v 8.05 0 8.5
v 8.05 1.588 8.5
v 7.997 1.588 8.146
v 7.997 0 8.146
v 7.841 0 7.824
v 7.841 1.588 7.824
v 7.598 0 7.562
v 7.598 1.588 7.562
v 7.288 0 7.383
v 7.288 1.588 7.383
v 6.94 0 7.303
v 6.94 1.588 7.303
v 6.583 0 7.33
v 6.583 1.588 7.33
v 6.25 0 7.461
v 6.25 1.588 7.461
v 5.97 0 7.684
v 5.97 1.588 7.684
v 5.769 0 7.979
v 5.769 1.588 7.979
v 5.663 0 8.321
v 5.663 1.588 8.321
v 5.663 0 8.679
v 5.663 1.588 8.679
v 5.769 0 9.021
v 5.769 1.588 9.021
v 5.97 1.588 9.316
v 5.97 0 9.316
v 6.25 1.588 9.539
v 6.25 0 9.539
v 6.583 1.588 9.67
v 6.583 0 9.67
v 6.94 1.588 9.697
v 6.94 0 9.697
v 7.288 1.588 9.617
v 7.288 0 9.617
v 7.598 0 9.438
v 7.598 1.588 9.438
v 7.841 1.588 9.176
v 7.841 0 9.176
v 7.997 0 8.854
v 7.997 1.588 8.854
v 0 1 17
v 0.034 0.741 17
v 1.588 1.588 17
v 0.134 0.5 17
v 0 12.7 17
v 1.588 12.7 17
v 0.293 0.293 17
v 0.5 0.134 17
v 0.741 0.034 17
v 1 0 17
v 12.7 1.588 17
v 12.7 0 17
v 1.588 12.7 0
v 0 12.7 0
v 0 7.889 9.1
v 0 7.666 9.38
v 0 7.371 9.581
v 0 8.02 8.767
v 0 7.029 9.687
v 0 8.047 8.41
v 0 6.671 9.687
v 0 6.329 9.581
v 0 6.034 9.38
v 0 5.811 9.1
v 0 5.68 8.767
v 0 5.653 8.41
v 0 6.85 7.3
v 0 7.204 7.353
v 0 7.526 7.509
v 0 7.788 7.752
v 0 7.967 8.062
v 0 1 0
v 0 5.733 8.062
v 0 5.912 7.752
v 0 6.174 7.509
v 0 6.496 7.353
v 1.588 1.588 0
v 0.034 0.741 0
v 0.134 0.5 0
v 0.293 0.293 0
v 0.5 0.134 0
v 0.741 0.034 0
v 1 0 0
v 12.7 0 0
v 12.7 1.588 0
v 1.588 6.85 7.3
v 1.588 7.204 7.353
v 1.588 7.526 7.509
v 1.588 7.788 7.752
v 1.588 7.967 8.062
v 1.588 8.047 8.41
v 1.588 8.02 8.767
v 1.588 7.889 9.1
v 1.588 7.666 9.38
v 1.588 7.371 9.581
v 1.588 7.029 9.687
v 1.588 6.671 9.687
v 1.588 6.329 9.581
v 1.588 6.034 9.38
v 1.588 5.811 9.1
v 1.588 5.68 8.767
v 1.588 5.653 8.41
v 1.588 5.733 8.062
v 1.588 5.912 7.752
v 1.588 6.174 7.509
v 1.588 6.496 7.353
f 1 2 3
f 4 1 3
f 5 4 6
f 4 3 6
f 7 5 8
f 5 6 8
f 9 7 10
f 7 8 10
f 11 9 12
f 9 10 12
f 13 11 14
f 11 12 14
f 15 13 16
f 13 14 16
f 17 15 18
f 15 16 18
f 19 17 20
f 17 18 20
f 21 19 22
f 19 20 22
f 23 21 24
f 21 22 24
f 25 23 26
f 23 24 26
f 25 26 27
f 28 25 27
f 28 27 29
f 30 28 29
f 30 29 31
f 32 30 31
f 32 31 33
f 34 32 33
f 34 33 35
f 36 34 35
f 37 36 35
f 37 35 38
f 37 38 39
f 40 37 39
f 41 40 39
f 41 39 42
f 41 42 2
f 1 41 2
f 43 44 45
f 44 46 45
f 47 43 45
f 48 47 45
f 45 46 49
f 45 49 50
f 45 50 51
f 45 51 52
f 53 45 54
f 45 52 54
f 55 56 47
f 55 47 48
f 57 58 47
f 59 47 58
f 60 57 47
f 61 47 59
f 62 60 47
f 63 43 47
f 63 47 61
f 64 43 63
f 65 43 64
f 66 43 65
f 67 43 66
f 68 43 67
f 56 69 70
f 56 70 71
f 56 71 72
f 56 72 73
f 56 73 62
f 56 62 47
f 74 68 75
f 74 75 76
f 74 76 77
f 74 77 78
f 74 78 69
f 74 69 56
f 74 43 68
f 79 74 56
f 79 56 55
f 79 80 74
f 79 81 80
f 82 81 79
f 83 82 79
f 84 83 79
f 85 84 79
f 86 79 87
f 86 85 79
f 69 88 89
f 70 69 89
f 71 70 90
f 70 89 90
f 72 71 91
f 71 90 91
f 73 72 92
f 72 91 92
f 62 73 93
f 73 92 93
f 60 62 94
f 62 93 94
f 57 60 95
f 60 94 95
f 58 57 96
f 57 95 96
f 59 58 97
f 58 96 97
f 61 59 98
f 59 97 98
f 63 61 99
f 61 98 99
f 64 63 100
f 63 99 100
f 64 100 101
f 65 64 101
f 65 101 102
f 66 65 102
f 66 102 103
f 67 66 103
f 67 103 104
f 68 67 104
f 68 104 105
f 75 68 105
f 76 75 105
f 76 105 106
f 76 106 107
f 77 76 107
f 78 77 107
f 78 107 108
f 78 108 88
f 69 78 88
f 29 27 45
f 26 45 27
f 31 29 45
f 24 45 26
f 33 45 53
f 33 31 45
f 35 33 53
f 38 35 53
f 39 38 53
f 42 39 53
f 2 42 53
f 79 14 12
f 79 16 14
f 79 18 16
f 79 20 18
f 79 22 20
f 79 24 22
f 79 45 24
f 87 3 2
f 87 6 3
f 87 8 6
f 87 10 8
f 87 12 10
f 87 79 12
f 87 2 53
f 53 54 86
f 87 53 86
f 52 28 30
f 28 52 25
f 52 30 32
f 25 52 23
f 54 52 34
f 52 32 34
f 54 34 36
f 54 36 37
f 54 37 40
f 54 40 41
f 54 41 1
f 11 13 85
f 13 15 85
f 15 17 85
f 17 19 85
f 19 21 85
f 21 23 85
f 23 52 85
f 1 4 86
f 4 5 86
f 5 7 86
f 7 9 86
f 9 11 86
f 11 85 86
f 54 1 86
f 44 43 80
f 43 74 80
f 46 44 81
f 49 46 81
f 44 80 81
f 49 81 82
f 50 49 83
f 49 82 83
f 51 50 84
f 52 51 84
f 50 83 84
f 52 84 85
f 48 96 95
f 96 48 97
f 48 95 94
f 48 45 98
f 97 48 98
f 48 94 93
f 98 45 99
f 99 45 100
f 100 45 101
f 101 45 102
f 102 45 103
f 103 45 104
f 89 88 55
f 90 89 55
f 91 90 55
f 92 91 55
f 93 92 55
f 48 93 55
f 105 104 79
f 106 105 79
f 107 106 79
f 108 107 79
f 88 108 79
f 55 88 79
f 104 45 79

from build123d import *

# Parameters (mm, degrees)
SKETCH1_W                = 12.7
SKETCH1_H                = 17
BOSS_EXTRUDE1_DEPTH      = 1.5875
SKETCH2_W                = 1.5875
SKETCH2_H                = 17
BOSS_EXTRUDE2_DEPTH      = 11.1125
FILLET1_R                = 1
M2_CLEARANCE_HOLE1_D     = 2.4
M2_CLEARANCE_HOLE1_DEPTH = 2
M2_CLEARANCE_HOLE1_TIP   = 0.721032743
M2_CLEARANCE_HOLE2_D     = 2.4
M2_CLEARANCE_HOLE2_DEPTH = 2
M2_CLEARANCE_HOLE2_TIP   = 0.721032743


with BuildPart() as part:
    # Sketch1 → Boss-Extrude1 (new body)
    with BuildSketch(Plane(origin=(0, 0, 0), x_dir=(1, 0, 0), z_dir=(0, 1, 0))):
        with Locations((6.35, -8.5)):
            Rectangle(SKETCH1_W, SKETCH1_H)
    extrude(amount=BOSS_EXTRUDE1_DEPTH)

    # Sketch2 → Boss-Extrude2 (add)
    with BuildSketch(Plane(origin=(0, 1.5875, 0), x_dir=(1, 0, 0), z_dir=(0, 1, 0))):
        with Locations((0.79375, -8.5)):
            Rectangle(SKETCH2_W, SKETCH2_H)
    extrude(amount=BOSS_EXTRUDE2_DEPTH)

    # Fillet1
    fillet1_edges = [part.edges().sort_by_distance(p)[0] for p in [
        (0, 0, 8.5),
    ]]
    fillet(fillet1_edges, radius=FILLET1_R)

    # M2 Clearance Hole1
    with Locations(Plane(origin=(0, 0, 0), x_dir=(-1, 0, 0), z_dir=(0, -1, 0))):
        with Locations((-6.85, -8.5)):
            Hole(M2_CLEARANCE_HOLE1_D / 2, depth=M2_CLEARANCE_HOLE1_DEPTH)
            with Locations((0, 0, -(M2_CLEARANCE_HOLE1_DEPTH + M2_CLEARANCE_HOLE1_TIP / 2))):  # 118° drill point
                Cone(0, M2_CLEARANCE_HOLE1_D / 2, M2_CLEARANCE_HOLE1_TIP, mode=Mode.SUBTRACT)

    # M2 Clearance Hole2
    with Locations(Plane.ZY):
        with Locations((8.5, 6.85)):
            Hole(M2_CLEARANCE_HOLE2_D / 2, depth=M2_CLEARANCE_HOLE2_DEPTH)
            with Locations((0, 0, -(M2_CLEARANCE_HOLE2_DEPTH + M2_CLEARANCE_HOLE2_TIP / 2))):  # 118° drill point
                Cone(0, M2_CLEARANCE_HOLE2_D / 2, M2_CLEARANCE_HOLE2_TIP, mode=Mode.SUBTRACT)


solid = part.part
